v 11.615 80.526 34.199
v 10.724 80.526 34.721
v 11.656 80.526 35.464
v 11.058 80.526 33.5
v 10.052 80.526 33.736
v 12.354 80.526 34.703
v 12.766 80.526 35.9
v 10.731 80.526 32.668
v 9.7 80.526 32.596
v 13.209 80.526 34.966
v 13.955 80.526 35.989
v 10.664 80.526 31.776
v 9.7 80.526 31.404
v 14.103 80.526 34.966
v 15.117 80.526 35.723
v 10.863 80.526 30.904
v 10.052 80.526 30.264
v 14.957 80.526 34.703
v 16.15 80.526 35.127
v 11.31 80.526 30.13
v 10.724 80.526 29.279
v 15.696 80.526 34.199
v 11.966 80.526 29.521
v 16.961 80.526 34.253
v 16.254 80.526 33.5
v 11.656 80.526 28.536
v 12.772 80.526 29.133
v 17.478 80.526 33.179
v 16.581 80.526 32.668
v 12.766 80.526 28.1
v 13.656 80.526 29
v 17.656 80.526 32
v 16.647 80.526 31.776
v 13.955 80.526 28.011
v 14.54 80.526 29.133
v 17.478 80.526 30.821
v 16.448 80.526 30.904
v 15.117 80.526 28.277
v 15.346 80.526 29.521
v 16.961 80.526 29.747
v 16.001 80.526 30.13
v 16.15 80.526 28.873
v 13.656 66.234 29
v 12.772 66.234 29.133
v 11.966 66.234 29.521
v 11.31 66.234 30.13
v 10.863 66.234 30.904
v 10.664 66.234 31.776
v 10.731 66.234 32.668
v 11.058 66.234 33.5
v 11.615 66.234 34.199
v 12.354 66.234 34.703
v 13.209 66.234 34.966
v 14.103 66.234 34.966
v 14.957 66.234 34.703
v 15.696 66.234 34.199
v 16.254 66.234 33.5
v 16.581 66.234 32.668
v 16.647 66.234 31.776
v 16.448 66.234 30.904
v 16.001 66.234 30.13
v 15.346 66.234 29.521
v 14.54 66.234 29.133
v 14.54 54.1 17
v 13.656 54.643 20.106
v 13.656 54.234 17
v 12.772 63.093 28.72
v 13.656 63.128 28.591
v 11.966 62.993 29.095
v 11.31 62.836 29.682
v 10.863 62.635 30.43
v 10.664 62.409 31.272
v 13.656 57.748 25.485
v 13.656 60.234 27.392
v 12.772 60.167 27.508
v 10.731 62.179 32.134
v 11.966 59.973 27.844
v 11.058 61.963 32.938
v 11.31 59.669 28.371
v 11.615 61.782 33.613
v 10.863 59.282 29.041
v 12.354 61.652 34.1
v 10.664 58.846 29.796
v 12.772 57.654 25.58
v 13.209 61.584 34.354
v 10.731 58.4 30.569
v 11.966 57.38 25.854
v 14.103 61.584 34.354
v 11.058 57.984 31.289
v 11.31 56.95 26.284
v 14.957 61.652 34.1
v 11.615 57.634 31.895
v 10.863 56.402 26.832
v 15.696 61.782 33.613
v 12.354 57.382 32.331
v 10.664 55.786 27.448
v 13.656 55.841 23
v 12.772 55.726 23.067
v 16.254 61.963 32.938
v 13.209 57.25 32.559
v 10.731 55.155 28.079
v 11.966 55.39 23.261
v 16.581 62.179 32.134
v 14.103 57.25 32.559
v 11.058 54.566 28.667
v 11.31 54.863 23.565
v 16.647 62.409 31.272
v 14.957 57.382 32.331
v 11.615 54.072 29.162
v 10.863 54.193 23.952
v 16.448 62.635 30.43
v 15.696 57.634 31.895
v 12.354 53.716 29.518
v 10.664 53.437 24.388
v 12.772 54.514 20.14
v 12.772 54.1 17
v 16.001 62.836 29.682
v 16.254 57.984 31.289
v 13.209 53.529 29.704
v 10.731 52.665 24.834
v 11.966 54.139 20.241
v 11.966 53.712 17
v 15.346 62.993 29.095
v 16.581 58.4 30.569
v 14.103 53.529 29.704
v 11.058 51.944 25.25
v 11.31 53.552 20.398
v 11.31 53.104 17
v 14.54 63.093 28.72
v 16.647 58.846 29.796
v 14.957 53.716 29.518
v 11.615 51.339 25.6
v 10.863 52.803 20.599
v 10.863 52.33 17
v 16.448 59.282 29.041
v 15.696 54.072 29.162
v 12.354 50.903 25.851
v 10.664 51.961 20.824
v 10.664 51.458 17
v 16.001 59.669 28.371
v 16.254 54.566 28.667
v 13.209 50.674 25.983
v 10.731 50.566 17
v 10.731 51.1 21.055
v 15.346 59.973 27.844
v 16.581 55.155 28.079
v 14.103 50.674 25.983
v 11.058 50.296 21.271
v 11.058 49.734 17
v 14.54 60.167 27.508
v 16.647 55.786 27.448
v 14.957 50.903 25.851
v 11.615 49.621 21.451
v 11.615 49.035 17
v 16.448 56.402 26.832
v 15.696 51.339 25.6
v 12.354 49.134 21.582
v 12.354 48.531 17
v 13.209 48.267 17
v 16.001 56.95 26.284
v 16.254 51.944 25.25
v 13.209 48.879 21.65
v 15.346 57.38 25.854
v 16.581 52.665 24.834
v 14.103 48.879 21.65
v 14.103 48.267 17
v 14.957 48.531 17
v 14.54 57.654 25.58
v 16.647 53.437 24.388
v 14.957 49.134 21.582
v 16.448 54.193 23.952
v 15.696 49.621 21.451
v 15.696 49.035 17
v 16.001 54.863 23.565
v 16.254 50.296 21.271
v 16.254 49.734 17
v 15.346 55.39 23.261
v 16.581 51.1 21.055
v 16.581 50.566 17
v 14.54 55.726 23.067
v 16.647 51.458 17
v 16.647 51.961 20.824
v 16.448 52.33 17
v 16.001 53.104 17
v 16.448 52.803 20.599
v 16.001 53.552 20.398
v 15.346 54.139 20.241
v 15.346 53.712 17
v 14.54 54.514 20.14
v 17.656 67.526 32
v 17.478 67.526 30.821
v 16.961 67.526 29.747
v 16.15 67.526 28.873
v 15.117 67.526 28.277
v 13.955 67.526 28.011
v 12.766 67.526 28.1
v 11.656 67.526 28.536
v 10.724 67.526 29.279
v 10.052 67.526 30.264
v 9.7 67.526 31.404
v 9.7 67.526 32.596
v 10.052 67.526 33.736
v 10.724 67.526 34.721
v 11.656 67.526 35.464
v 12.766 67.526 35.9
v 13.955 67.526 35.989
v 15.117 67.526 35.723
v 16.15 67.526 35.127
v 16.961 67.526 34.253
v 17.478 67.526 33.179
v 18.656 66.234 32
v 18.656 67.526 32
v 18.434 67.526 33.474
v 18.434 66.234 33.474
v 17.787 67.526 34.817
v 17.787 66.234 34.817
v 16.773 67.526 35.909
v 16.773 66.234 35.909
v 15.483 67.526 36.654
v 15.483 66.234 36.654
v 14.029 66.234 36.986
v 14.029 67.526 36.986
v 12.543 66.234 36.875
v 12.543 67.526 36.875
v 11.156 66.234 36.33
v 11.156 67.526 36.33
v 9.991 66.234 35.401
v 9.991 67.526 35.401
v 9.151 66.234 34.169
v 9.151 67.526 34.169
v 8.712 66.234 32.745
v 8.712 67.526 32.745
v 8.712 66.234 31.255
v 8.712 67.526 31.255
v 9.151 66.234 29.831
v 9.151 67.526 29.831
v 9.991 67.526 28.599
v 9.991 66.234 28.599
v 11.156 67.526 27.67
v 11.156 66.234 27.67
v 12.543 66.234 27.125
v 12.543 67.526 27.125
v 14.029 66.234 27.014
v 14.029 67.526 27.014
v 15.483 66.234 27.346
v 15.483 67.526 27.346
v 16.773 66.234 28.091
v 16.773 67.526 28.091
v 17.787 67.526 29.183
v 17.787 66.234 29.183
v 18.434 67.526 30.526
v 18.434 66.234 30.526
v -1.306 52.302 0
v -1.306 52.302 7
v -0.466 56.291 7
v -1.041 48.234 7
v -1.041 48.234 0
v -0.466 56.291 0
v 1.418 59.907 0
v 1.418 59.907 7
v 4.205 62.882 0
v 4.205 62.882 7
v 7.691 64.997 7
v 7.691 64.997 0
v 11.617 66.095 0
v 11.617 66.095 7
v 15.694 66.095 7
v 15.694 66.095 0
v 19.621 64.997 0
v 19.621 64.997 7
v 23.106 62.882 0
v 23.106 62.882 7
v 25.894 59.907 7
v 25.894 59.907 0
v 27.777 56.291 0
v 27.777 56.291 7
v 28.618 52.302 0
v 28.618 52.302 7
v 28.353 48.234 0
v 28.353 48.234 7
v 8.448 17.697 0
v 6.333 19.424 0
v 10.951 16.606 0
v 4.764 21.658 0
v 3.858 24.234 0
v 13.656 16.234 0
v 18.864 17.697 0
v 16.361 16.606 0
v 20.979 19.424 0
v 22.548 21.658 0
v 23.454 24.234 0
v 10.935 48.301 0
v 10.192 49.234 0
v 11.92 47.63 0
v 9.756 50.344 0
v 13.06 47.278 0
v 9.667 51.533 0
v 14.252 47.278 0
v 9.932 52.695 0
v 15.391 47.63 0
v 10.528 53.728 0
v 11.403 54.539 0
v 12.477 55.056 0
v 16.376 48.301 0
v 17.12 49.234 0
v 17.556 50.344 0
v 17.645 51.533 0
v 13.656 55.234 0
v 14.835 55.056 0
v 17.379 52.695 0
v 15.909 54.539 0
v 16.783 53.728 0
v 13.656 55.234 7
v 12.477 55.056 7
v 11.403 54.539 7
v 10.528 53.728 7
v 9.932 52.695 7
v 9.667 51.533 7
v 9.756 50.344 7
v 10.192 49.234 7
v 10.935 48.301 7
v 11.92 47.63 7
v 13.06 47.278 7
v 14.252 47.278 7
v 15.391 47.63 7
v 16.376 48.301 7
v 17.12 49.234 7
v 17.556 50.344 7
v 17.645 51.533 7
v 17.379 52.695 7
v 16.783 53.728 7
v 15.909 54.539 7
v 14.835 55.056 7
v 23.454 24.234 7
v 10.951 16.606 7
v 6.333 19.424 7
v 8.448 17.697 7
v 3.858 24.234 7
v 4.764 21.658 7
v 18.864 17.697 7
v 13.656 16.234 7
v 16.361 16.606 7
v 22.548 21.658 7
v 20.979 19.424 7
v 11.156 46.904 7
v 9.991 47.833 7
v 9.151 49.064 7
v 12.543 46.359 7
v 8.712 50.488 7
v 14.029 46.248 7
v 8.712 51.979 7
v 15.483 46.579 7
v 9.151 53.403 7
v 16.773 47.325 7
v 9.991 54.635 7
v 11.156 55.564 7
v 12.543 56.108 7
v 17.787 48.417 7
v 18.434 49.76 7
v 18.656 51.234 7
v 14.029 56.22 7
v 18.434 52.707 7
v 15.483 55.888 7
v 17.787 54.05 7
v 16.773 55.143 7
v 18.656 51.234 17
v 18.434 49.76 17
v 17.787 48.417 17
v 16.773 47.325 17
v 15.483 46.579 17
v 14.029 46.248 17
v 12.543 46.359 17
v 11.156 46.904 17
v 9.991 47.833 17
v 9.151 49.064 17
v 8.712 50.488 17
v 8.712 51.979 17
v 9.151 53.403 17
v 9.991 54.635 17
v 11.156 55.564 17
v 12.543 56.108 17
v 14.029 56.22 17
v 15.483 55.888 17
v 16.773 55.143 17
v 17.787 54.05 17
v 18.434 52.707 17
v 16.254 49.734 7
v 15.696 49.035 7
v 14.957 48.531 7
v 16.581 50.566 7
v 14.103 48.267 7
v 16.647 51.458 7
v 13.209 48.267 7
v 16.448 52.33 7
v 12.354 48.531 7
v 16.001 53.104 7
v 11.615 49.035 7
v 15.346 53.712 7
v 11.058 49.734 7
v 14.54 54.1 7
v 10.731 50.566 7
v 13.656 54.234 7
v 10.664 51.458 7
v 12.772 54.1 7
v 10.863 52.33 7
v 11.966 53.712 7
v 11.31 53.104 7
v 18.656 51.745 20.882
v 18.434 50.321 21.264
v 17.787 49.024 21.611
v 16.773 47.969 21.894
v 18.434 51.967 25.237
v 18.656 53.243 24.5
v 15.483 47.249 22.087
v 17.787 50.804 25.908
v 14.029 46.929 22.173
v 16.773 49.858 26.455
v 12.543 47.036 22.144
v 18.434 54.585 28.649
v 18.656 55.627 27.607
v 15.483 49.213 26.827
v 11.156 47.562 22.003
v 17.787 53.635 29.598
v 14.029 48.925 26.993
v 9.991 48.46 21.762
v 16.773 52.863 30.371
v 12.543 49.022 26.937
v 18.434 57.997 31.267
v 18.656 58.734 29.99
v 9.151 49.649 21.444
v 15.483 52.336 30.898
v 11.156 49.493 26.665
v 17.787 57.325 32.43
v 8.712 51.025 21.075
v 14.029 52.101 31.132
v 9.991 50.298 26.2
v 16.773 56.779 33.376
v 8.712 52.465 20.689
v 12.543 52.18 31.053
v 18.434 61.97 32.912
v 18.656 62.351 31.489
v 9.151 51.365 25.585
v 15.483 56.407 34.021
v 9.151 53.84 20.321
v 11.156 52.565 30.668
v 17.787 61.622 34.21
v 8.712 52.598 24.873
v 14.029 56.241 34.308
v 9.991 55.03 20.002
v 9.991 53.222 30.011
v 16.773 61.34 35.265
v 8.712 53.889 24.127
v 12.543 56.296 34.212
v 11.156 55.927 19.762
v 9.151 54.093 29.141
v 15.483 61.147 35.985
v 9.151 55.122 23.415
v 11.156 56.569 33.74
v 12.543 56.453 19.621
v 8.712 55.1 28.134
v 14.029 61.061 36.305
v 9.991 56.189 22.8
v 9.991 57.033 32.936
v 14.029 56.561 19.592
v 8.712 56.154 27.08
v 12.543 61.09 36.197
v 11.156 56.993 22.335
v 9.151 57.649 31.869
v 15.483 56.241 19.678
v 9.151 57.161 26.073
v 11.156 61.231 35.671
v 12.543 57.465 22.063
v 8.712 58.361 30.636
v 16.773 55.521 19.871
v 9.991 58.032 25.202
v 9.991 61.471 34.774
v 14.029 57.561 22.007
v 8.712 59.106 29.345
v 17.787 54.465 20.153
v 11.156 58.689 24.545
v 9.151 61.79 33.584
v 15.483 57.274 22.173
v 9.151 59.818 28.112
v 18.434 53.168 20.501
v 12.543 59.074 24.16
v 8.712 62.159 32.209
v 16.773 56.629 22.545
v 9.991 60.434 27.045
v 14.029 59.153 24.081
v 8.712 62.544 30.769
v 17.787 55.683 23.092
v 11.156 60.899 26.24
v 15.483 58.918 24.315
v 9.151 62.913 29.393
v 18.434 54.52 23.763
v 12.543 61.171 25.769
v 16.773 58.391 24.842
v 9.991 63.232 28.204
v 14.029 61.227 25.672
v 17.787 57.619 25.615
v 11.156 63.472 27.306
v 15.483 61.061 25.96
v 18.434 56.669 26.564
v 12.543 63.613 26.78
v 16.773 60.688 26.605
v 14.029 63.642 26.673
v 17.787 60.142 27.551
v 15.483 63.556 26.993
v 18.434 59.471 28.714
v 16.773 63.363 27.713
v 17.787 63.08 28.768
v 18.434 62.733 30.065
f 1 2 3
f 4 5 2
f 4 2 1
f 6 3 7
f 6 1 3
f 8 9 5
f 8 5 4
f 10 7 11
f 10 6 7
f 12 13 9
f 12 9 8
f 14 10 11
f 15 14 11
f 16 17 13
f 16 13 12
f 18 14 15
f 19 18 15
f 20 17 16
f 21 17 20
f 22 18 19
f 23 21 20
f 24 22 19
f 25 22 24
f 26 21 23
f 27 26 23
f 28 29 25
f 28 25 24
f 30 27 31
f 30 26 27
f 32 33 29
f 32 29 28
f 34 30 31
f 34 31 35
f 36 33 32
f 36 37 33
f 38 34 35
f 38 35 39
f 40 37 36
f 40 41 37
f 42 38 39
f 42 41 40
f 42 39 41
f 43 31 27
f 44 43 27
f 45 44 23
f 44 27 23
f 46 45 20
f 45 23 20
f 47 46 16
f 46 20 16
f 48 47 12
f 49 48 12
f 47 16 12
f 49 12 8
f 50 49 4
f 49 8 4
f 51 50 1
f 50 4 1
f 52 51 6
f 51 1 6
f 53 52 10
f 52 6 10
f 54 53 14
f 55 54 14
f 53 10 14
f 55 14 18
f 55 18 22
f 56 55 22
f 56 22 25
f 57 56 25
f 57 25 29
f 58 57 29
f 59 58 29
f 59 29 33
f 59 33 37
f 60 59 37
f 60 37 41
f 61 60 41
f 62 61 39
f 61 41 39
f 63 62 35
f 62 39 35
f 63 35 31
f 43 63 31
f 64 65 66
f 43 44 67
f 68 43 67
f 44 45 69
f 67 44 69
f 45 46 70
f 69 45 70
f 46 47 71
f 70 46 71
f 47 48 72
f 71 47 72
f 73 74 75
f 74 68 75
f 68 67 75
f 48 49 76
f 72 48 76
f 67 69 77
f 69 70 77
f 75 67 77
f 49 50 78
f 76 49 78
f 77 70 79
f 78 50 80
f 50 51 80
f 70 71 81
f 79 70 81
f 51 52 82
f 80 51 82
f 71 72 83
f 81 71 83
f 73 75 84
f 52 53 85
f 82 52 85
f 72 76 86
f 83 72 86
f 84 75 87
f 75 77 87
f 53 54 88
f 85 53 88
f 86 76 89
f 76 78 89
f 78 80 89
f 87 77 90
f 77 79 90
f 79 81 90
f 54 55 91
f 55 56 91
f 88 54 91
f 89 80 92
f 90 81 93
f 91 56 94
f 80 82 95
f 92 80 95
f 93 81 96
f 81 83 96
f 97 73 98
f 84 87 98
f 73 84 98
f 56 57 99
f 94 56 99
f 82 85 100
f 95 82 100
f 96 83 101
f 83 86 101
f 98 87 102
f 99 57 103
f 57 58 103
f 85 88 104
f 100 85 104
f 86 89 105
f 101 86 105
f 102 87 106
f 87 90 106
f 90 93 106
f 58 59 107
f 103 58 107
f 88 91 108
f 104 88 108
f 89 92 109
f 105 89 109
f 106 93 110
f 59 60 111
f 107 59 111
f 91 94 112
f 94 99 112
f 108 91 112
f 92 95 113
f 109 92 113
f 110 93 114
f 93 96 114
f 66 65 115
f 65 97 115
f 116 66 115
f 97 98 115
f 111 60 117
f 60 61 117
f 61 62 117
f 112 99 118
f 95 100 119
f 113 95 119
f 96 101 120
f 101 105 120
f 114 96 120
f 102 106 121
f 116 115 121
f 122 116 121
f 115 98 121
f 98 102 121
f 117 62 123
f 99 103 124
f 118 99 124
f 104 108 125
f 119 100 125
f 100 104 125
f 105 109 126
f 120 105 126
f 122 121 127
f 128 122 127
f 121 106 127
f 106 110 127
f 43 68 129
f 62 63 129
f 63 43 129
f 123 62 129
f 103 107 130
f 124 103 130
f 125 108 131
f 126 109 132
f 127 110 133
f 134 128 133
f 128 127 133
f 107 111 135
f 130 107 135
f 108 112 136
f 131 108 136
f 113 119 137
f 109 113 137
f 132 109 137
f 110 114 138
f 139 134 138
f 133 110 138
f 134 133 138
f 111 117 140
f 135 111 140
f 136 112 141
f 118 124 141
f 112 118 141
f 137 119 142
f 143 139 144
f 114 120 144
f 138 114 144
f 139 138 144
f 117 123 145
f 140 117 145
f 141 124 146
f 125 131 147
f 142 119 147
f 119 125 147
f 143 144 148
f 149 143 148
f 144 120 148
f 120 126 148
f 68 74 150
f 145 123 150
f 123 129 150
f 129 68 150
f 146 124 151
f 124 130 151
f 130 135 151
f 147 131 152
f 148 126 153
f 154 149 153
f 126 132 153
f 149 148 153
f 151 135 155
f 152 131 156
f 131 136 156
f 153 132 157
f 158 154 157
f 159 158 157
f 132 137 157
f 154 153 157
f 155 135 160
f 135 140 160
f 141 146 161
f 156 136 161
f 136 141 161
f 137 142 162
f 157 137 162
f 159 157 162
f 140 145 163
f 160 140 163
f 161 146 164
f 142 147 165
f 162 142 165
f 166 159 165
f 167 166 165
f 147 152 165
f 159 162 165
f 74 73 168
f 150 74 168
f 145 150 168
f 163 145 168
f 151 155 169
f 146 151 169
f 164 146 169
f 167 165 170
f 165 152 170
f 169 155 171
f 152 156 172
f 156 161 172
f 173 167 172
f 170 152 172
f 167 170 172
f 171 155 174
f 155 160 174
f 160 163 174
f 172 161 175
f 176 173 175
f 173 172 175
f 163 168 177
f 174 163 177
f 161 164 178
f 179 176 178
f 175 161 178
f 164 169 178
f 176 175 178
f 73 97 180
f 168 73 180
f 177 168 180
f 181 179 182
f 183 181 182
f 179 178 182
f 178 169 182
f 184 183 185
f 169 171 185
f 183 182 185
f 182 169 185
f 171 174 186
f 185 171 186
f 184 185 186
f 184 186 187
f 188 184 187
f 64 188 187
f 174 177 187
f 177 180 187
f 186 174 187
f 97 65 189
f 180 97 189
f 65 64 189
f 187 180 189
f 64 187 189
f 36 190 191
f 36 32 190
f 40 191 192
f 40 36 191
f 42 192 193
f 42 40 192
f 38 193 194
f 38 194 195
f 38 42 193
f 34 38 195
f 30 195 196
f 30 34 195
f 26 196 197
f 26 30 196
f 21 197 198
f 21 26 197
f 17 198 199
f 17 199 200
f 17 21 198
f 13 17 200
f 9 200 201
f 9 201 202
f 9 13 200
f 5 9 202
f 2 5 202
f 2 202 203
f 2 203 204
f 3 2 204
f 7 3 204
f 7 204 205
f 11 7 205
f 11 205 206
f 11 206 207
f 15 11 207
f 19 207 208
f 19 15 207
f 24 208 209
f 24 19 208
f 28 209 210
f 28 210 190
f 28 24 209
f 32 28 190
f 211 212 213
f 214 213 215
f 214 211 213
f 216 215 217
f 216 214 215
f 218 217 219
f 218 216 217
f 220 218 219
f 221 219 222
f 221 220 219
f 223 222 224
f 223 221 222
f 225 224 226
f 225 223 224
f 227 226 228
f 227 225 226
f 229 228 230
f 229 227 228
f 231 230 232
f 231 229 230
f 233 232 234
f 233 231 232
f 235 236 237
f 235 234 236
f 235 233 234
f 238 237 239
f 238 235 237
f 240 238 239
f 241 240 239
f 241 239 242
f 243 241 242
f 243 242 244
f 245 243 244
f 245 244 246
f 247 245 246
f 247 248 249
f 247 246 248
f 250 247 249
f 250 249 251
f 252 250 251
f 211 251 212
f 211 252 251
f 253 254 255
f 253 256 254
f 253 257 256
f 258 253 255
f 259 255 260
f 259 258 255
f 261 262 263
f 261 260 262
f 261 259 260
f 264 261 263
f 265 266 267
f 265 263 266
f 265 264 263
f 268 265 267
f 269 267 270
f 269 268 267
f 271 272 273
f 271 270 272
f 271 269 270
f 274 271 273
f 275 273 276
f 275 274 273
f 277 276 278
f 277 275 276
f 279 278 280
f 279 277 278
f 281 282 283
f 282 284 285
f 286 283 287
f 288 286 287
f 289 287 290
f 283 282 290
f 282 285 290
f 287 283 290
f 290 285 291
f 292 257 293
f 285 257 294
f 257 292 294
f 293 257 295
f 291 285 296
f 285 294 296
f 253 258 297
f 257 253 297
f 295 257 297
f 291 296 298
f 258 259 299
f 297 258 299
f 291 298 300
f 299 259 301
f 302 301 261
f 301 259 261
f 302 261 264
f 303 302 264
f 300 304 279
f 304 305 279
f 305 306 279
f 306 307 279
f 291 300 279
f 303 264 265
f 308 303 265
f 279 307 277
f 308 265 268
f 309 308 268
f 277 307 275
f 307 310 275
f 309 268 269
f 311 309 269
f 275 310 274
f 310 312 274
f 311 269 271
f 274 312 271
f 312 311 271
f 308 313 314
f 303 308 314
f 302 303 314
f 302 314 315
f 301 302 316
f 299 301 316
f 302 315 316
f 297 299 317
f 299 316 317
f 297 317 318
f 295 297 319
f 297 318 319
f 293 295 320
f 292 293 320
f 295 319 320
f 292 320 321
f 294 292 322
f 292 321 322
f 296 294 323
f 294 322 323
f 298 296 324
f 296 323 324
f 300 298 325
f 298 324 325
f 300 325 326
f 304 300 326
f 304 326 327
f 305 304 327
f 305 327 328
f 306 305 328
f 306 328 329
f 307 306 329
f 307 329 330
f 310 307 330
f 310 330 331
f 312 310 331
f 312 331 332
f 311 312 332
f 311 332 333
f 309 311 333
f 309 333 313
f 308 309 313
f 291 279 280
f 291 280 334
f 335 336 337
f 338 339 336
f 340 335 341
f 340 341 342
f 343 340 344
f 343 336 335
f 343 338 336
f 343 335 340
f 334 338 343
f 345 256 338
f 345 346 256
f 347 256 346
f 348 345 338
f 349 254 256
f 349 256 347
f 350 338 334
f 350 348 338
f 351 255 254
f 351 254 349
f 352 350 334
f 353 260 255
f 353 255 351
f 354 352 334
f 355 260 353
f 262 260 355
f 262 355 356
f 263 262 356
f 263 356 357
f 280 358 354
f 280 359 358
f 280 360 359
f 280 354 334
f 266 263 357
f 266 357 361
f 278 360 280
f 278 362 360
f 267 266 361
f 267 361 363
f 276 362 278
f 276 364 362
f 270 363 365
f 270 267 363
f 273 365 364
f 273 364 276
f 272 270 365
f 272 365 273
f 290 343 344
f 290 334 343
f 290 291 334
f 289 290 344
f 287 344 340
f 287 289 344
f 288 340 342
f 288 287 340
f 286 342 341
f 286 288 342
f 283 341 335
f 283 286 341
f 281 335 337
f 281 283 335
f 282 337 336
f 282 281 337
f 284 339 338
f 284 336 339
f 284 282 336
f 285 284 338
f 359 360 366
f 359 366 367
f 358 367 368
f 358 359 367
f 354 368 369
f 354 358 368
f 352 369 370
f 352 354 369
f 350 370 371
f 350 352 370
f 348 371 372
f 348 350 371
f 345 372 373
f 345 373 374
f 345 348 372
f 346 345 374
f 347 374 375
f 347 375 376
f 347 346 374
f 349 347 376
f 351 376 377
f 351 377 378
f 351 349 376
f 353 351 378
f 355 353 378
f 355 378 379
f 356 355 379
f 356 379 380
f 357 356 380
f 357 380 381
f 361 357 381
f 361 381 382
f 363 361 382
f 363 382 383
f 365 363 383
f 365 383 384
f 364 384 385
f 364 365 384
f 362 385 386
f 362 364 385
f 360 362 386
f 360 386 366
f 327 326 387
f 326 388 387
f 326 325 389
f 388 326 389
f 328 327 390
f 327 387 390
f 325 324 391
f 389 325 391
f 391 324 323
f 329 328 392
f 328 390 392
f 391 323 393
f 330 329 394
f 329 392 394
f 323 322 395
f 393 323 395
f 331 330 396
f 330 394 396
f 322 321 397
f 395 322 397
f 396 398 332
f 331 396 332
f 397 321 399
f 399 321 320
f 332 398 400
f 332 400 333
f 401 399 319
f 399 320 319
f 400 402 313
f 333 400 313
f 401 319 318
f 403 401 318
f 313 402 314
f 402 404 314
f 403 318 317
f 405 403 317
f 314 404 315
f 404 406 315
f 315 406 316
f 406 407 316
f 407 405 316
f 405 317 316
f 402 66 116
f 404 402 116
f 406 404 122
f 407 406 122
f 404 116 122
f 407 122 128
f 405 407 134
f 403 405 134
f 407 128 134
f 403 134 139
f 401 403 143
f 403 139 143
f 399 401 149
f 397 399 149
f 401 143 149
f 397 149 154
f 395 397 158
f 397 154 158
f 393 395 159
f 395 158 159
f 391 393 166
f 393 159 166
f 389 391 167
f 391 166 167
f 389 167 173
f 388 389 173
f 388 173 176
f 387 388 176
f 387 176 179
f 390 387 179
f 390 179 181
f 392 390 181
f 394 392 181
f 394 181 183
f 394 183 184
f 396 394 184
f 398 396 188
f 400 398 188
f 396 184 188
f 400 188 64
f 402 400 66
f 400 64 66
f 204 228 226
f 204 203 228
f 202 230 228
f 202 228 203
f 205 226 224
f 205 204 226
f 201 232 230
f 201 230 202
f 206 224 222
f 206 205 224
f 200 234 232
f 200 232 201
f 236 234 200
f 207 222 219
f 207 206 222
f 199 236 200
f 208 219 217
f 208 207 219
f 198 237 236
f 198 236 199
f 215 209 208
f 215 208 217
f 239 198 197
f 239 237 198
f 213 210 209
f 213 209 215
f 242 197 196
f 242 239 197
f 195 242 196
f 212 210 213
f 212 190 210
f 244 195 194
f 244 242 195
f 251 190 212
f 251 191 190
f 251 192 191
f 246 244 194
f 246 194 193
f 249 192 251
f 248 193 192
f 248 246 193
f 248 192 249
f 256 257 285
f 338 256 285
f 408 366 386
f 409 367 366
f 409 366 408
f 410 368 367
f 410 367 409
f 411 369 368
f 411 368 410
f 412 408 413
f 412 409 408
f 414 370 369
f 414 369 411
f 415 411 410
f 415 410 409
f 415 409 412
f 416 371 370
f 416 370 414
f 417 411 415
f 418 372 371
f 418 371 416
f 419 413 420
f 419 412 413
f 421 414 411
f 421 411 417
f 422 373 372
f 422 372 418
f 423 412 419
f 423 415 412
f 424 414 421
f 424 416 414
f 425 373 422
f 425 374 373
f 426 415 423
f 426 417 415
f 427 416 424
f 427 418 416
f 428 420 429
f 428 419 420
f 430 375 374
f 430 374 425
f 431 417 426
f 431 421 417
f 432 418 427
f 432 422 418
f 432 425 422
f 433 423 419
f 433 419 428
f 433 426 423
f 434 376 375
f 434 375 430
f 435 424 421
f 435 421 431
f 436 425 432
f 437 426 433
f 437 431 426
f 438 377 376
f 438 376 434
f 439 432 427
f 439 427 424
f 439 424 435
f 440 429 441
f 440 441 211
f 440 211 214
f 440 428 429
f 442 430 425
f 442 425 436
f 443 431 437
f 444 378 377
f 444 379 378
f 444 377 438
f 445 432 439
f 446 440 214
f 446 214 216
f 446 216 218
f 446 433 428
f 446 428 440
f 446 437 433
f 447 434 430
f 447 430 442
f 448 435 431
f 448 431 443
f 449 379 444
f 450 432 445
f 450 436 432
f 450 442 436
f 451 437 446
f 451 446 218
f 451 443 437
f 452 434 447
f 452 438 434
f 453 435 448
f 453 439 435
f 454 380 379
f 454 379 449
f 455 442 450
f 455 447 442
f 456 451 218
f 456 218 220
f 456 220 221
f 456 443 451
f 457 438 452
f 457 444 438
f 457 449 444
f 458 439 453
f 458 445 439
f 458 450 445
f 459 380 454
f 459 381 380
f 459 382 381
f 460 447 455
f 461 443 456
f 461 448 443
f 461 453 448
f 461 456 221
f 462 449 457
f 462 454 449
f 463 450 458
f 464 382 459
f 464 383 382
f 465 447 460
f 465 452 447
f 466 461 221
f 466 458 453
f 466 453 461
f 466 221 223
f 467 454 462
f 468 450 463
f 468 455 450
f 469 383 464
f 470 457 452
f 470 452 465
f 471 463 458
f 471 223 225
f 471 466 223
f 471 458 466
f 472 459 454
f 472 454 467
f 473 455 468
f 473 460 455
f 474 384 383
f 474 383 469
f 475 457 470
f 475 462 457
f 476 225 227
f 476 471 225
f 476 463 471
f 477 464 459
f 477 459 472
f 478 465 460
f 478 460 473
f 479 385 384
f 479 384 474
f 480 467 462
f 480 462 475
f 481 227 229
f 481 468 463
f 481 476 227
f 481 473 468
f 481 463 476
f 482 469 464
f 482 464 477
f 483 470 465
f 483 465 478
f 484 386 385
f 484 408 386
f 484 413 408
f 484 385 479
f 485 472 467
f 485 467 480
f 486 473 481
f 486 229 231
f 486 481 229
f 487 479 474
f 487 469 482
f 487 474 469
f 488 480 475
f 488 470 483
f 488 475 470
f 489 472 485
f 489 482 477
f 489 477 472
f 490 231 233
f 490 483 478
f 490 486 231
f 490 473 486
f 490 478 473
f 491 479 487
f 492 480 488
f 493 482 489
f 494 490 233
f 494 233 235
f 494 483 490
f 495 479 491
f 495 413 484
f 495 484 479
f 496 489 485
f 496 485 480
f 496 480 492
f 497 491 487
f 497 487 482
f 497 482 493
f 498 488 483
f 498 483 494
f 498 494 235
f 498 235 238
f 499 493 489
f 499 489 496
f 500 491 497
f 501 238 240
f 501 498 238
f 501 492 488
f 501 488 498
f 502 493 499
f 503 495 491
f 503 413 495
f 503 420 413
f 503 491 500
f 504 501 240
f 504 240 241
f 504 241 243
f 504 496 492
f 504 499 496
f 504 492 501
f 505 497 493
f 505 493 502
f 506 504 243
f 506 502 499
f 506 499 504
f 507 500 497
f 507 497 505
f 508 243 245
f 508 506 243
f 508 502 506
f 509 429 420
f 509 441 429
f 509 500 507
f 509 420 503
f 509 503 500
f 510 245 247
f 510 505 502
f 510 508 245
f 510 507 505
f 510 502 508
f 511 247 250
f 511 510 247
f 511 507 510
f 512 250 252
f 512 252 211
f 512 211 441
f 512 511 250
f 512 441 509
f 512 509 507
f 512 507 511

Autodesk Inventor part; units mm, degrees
ref_plane "YZ Plane" through (0, 0, 0) normal (1, 0, 0) x (0, 1, 0)
ref_plane "XY Plane" through (0, 0, 0) normal (0, 0, 1) x (1, 0, 0)
sketch "Sketch1" plane through (0, 0, 0) normal (0, 0, 1) x (1, 0, 0)
  arc A0 (3.8578, 24.2337) -> (23.4537, 24.2337) centre (13.6558, 26.2337) ccw
  arc A1 (28.3527, 48.2337) -> (-1.0412, 48.2337) centre (13.6558, 51.2337) ccw
  line L0 (-1.0412, 48.2337) -> (3.8578, 24.2337)
  line L1 (28.3527, 48.2337) -> (23.4537, 24.2337)
  dimension "d32" = 20
  dimension "d33" = 30
extrude "Extrusion8" add sketch "Sketch1" along normal blind 7
sketch "Sketch8" plane through (0, 0, 7) normal (0, 0, 1) x (1, 0, 0)
  arc A0 (28.3527, 48.2337) -> (-1.0412, 48.2337) centre (13.6558, 51.2337) ccw projected
  circle A1 centre (13.6558, 51.2337) radius 5
  point P0 (0, 0)
  dimension "d36" = 10
extrude "Extrusion9" add sketch "Sketch8" along normal blind 40
ref_plane "Work Plane8" through (13.6558, 56.2337, 7) normal (0, 1, 0) x (-1, 0, 0)
sketch "Sketch13" plane through (0, 0, 0) normal (0, 0, -1) x (-1, 0, 0)
  circle A0 centre (-13.6558, 51.2337) radius 5 projected
  circle A1 centre (-13.6558, 51.2337) radius 5
  point P0 (0, 0)
hole "Hole1" at (13.6558, 51.2337, 0) direction (0, 0, 1) diameter 6 end through all counterbore diameter 8 counterbore depth 7
sketch "Sketch14" plane through (13.6558, 51.2337, 47) normal (0, 0, 1) x (1, 0, 0)
  circle A0 centre (0, 0) radius 4
  arc A1 (14.6969, -3) -> (-14.6969, -3) centre (0, 0) ccw projected
  circle A2 centre (0, 0) radius 5
  point P0 (-13.6558, -51.2337)
  dimension "d52" = 8
extrude "Extrusion11" cut sketch "Sketch14" against normal blind 13
sketch "Sketch15" plane through (13.6558, 56.2337, 7) normal (0, 1, 0) x (-1, 0, 0)
  line L0 (5, 10) -> (-5.1311, 10)
  line L1 (4, 40) -> (-4, 40) projected
  point P0 (13.6558, -7)
  dimension "d55" = 30
bend part "Bend Part3" radius 10 angle 90 line through (8.6558, 56.2337, 17) along (1, 0, 0) centre toward (0, 1, 0) moving side (0, 0, 1) both sides no
properties part number "Vòi"
